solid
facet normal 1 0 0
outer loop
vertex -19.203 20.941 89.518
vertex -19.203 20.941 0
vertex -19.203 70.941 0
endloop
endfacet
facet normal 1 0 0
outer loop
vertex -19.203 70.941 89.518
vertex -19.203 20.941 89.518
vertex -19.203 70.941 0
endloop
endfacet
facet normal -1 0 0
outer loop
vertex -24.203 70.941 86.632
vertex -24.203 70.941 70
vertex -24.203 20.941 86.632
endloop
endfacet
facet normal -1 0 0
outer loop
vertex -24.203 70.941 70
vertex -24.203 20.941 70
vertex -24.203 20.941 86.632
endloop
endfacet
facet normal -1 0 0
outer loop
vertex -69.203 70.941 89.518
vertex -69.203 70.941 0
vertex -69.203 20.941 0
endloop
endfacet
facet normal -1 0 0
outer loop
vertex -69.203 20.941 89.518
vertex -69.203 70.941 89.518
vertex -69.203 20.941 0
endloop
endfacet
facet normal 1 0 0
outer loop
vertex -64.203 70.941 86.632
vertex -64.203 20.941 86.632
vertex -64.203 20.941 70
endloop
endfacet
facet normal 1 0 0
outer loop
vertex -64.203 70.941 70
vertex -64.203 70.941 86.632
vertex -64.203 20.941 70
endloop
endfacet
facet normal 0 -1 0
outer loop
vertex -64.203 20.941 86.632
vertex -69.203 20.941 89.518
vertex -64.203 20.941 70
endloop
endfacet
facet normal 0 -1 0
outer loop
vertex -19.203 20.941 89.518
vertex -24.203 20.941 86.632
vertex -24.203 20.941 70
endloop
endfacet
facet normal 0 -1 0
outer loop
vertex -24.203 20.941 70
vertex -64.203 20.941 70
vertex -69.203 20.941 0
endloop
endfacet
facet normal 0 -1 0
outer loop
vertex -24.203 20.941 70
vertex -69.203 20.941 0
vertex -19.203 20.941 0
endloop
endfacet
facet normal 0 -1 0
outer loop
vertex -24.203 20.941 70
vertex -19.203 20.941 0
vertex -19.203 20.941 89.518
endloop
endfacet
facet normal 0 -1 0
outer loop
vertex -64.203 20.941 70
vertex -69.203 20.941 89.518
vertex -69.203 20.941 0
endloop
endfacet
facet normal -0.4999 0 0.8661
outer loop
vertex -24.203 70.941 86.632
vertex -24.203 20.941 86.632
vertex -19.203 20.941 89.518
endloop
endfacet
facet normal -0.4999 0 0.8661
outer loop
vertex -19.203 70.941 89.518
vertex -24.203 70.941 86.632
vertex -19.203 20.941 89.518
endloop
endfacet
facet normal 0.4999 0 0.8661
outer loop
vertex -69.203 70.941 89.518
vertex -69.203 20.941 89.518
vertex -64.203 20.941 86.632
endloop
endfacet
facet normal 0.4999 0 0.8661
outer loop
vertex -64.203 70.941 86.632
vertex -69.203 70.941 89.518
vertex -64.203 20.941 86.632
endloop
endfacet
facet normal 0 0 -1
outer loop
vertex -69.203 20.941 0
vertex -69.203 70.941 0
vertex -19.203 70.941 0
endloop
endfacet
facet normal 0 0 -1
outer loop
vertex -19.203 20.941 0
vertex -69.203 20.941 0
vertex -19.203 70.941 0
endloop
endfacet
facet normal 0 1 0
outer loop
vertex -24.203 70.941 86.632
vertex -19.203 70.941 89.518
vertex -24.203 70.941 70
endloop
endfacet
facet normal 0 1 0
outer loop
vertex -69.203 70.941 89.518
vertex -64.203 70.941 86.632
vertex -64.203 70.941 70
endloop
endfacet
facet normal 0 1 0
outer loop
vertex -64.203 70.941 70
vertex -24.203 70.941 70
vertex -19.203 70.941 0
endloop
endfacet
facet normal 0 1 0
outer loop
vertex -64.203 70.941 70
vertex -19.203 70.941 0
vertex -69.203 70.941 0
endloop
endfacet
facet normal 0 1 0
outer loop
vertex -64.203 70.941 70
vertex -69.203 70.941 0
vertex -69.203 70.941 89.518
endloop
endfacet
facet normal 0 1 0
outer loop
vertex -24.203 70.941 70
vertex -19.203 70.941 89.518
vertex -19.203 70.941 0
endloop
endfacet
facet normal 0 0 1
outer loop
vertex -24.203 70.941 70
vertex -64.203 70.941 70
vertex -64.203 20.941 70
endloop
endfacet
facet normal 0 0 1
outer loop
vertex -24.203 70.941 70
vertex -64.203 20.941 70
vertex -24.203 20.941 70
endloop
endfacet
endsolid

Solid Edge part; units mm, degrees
sketch "Sketch1" plane through (0, 0, 0) normal (0, 0, 1) x (1, 0, 0)
  line L0 (-69.2032, 20.9413) -> (-19.2032, 20.9413)
  line L1 (-19.2032, 20.9413) -> (-19.2032, 70.9413)
  line L2 (-19.2032, 70.9413) -> (-69.2032, 70.9413)
  line L3 (-69.2032, 70.9413) -> (-69.2032, 20.9413)
extrude "Protrusion1" add sketch "Sketch1" along normal blind 70
sketch "Sketch2" plane through (-19.2032, 45.9413, 5) normal (1, 0, 0) x (0, 1, 0)
  line L0 (-25, 65) -> (25, 65)
  line L1 (25, 65) -> (25, 85)
  line L2 (25, 85) -> (-25, 85)
  line L3 (-25, 85) -> (-25, 65)
  dimension "D1" = 20
  dimension "D2" = 50
extrude "ExtrudedProtrusion_2" add sketch "Sketch2" against normal blind 5
sketch "Sketch3" plane through (-44.2032, 20.9413, 30) normal (0, -1, 0) x (1, 0, 0)
  line L0 (17.1738, 55) -> (25.8341, 60)
  line L1 (25.8341, 60) -> (20.8341, 68.6602)
  line L2 (20.8341, 68.6602) -> (12.1738, 63.6602)
  line L3 (12.1738, 63.6602) -> (17.1738, 55)
  dimension "D1" = 10
  dimension "D2" = 10
extrude "Cutout1" cut sketch "Sketch3" against normal through all
mirror "Mirror1" about plane through (-44.2032, 45.9413, 30) normal (1, 0, 0) of "ExtrudedProtrusion_2", "Cutout1"
